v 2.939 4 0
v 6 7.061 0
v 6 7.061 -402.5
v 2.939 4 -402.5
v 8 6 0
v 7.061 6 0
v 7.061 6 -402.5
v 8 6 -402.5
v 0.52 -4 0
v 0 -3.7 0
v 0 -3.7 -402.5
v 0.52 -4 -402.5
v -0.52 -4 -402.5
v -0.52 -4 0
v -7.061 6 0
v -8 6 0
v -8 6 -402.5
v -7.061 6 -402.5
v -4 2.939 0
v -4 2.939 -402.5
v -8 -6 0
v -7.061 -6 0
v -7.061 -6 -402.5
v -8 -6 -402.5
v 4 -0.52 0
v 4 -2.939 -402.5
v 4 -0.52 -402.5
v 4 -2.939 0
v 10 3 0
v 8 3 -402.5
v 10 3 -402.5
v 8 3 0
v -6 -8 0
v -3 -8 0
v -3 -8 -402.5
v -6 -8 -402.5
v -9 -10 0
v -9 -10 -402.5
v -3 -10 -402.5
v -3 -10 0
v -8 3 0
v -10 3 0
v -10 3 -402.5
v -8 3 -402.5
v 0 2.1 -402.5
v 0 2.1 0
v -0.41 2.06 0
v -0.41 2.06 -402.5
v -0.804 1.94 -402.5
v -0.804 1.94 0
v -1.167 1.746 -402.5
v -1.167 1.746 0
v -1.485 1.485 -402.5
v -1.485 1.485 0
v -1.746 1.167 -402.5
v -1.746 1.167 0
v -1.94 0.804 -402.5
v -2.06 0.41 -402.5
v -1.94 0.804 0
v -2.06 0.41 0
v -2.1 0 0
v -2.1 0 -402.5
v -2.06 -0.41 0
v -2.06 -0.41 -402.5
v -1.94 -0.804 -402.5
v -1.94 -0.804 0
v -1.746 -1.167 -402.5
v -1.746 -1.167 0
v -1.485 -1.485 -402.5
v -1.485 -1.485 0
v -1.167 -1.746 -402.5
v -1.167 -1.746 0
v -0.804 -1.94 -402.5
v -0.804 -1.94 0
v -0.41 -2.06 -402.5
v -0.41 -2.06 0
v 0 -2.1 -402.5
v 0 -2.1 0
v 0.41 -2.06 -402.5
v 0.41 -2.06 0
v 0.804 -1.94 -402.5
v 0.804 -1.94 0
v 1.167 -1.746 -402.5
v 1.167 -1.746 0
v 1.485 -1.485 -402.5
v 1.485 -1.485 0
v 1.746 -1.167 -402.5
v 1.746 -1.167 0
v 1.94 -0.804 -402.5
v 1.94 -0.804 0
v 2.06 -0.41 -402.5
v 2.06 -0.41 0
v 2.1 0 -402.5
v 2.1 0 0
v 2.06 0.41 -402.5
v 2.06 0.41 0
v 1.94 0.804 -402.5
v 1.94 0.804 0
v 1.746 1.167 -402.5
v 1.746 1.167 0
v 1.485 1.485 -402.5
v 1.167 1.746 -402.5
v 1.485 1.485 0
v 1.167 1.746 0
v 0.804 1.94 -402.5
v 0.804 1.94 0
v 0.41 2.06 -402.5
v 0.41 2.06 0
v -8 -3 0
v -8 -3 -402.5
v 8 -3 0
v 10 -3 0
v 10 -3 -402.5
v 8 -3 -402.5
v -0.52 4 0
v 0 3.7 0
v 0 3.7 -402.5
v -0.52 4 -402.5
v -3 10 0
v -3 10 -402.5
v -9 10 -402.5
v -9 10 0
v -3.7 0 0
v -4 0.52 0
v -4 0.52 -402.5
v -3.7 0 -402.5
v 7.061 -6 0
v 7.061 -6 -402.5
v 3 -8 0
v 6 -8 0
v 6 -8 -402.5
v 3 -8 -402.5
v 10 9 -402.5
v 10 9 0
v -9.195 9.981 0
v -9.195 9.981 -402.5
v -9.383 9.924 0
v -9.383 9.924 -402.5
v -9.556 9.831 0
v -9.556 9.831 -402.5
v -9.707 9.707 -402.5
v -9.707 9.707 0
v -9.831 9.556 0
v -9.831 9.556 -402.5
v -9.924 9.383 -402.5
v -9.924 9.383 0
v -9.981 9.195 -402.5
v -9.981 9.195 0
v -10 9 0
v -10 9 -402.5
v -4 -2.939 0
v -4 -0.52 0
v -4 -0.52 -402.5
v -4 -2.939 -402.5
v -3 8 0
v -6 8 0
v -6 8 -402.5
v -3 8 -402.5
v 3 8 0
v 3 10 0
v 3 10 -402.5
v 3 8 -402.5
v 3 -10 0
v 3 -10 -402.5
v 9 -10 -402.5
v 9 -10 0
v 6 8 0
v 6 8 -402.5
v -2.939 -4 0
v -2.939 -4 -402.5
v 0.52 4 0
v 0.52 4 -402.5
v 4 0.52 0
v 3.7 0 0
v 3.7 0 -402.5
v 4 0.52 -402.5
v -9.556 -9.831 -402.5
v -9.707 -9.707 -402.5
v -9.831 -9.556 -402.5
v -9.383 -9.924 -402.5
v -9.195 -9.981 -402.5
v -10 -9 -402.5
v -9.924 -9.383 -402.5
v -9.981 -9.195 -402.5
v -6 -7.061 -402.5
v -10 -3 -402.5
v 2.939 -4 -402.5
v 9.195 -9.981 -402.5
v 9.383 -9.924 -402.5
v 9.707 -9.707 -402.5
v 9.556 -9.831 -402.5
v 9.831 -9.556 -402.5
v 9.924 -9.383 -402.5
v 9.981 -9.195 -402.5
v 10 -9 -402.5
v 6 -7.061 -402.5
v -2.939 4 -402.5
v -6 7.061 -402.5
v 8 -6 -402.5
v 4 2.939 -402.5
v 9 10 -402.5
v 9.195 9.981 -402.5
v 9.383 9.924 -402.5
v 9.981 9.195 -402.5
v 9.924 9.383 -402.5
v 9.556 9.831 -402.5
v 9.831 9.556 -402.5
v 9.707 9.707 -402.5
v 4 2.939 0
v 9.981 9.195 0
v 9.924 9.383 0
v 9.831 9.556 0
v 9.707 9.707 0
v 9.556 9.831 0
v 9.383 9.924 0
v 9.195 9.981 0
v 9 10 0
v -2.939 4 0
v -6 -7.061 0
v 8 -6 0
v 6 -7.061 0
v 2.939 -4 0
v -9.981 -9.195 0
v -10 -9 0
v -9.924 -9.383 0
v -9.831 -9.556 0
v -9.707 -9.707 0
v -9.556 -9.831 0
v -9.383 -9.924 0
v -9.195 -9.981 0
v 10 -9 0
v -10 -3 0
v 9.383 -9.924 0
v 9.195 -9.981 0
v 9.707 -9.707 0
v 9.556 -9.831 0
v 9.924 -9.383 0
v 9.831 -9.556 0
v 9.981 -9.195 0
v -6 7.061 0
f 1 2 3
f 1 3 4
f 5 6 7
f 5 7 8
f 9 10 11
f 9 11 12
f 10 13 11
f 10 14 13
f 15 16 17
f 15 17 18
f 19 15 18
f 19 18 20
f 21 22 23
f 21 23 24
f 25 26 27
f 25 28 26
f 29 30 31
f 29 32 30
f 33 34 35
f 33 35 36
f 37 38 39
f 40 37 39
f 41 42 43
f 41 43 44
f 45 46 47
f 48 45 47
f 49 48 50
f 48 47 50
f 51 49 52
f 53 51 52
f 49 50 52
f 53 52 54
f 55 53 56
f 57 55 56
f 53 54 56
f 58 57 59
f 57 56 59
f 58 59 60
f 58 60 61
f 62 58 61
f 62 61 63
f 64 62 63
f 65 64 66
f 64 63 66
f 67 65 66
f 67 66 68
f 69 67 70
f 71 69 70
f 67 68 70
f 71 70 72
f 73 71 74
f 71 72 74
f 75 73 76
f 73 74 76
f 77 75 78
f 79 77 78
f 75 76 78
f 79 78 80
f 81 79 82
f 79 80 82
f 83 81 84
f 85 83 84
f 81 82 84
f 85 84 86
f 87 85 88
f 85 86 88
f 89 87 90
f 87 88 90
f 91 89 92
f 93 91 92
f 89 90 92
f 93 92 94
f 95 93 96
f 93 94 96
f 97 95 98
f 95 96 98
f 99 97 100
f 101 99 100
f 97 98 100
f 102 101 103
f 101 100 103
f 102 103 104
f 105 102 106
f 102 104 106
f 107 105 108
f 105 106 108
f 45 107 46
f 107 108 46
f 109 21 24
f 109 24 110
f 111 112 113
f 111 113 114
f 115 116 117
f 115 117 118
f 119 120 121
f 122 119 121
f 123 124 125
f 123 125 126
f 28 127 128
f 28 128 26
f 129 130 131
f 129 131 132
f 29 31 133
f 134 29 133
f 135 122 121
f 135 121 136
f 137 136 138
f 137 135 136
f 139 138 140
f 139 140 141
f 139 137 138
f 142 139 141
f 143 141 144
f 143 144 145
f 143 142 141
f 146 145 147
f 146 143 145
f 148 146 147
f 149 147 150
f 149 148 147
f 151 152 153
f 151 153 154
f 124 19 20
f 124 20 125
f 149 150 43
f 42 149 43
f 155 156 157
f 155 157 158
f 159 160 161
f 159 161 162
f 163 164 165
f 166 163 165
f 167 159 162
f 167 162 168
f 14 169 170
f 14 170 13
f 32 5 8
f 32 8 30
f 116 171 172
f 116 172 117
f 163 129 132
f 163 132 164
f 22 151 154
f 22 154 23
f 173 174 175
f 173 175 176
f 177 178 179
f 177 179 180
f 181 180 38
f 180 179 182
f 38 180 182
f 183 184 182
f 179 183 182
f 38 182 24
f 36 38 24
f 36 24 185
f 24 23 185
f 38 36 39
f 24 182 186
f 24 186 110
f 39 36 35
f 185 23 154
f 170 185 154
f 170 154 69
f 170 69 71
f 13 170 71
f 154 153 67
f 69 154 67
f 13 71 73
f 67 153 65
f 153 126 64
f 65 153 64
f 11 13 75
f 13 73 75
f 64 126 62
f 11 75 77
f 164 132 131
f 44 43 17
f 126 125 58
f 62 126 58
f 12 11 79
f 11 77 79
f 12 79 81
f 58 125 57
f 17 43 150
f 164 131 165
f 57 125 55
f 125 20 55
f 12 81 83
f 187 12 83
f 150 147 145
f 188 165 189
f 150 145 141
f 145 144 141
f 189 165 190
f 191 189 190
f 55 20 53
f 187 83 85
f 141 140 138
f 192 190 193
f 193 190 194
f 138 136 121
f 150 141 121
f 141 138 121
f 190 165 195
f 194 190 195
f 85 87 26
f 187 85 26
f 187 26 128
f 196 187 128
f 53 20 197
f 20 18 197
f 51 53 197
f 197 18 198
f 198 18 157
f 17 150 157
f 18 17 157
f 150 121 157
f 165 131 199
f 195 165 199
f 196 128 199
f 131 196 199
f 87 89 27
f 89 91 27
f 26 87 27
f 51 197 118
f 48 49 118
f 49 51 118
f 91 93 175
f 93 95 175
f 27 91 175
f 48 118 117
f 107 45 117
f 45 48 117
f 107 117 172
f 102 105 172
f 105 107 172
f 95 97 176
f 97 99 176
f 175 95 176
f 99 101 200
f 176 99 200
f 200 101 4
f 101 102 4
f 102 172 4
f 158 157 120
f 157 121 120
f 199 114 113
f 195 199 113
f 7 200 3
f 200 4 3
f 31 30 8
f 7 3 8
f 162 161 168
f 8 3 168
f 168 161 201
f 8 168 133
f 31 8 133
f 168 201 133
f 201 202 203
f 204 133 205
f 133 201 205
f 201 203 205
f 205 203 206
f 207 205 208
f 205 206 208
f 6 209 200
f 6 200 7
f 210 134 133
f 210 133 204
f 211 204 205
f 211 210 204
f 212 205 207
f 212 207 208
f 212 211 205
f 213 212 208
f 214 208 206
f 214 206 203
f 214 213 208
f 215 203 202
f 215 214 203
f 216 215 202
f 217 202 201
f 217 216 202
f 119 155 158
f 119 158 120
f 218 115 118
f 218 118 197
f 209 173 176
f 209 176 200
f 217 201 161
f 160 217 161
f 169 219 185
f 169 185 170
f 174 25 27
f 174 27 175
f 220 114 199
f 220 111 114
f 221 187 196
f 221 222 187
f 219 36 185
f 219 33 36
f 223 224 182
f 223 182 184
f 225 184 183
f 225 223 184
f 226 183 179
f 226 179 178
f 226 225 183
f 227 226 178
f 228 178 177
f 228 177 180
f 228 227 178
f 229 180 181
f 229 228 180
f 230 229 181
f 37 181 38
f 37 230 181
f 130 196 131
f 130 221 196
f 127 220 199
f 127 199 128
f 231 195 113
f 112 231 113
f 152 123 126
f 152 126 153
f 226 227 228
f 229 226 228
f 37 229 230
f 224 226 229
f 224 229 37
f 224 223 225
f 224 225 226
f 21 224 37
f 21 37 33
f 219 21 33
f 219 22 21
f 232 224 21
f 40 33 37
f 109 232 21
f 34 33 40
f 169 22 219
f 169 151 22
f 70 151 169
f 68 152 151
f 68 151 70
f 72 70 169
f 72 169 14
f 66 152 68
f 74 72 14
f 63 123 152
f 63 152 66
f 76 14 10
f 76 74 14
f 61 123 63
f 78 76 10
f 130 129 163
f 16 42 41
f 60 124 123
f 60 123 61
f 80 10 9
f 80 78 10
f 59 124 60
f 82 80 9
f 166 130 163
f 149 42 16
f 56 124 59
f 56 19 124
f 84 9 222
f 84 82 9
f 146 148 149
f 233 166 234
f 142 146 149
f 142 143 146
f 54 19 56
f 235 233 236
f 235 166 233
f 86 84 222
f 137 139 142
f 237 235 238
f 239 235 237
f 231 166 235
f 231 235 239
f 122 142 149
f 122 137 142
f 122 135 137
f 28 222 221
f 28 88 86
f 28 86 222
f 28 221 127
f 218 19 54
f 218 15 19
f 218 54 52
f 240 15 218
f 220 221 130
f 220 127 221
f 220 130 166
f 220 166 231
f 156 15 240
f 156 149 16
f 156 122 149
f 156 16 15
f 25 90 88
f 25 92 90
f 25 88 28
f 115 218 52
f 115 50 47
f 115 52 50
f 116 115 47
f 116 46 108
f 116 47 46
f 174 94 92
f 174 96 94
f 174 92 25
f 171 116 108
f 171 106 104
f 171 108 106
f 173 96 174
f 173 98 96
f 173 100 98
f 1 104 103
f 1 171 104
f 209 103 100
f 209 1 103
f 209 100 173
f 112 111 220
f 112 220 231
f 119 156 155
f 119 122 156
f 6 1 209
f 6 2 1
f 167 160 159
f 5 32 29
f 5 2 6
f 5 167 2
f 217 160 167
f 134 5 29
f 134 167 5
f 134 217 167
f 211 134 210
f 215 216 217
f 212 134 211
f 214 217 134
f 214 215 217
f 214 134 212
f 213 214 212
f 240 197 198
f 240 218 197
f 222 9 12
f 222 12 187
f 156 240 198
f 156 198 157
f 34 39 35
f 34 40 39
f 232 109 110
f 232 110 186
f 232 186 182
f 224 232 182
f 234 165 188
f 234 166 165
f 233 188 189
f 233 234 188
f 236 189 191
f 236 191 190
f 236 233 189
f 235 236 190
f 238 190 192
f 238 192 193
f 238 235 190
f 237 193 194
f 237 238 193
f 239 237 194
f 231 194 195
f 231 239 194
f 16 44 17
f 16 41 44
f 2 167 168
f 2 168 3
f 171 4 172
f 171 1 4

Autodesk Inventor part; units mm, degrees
sketch "Sketch_1" plane through (0, 0, 0) normal (0, 0, 1) x (1, 0, 0)
  line L0 (-10, -3) -> (-10, -9)
  arc A0 (-10, -9) -> (-9, -10) centre (-9, -9) ccw
  line L1 (-9, -10) -> (-3, -10)
  line L2 (-3, -10) -> (-3, -8)
  line L3 (-3, -8) -> (-6, -8)
  line L4 (-6, -8) -> (-6, -7.0607)
  line L5 (-6, -7.0607) -> (-2.9393, -4)
  line L6 (-2.9393, -4) -> (-0.5196, -4)
  line L7 (-0.5196, -4) -> (0, -3.7)
  line L8 (0, -3.7) -> (0.5196, -4)
  line L9 (0.5196, -4) -> (2.9393, -4)
  line L10 (2.9393, -4) -> (6, -7.0607)
  line L11 (6, -7.0607) -> (6, -8)
  line L12 (6, -8) -> (3, -8)
  line L13 (3, -8) -> (3, -10)
  line L14 (3, -10) -> (9, -10)
  arc A1 (9, -10) -> (10, -9) centre (9, -9) ccw
  line L15 (10, -9) -> (10, -3)
  line L16 (10, -3) -> (8, -3)
  line L17 (8, -3) -> (8, -6)
  line L18 (8, -6) -> (7.0607, -6)
  line L19 (7.0607, -6) -> (4, -2.9393)
  line L20 (4, -2.9393) -> (4, -0.5196)
  line L21 (4, -0.5196) -> (3.7, 0)
  line L22 (3.7, 0) -> (4, 0.5196)
  line L23 (4, 0.5196) -> (4, 2.9393)
  line L24 (4, 2.9393) -> (7.0607, 6)
  line L25 (7.0607, 6) -> (8, 6)
  line L26 (8, 6) -> (8, 3)
  line L27 (8, 3) -> (10, 3)
  line L28 (10, 3) -> (10, 9)
  arc A2 (10, 9) -> (9, 10) centre (9, 9) ccw
  line L29 (9, 10) -> (3, 10)
  line L30 (3, 10) -> (3, 8)
  line L31 (3, 8) -> (6, 8)
  line L32 (6, 8) -> (6, 7.0607)
  line L33 (6, 7.0607) -> (2.9393, 4)
  line L34 (2.9393, 4) -> (0.5196, 4)
  line L35 (0.5196, 4) -> (0, 3.7)
  line L36 (0, 3.7) -> (-0.5196, 4)
  line L37 (-0.5196, 4) -> (-2.9393, 4)
  line L38 (-2.9393, 4) -> (-6, 7.0607)
  line L39 (-6, 7.0607) -> (-6, 8)
  line L40 (-6, 8) -> (-3, 8)
  line L41 (-3, 8) -> (-3, 10)
  line L42 (-3, 10) -> (-9, 10)
  arc A3 (-9, 10) -> (-10, 9) centre (-9, 9) ccw
  line L43 (-10, 9) -> (-10, 3)
  line L44 (-10, 3) -> (-8, 3)
  line L45 (-8, 3) -> (-8, 6)
  line L46 (-8, 6) -> (-7.0607, 6)
  line L47 (-7.0607, 6) -> (-4, 2.9393)
  line L48 (-4, 2.9393) -> (-4, 0.5196)
  line L49 (-4, 0.5196) -> (-3.7, 0)
  line L50 (-3.7, 0) -> (-4, -0.5196)
  line L51 (-4, -0.5196) -> (-4, -2.9393)
  line L52 (-4, -2.9393) -> (-7.0607, -6)
  line L53 (-7.0607, -6) -> (-8, -6)
  line L54 (-8, -6) -> (-8, -3)
  line L55 (-8, -3) -> (-10, -3)
extrude "Extrusion1" add sketch "Sketch_1" against normal blind 402.5
sketch "Sketch2" plane through (0, 0, -402.5) normal (0, 0, -1) x (-1, 0, 0)
  point P0 (0, 0)
hole "Hole1" at (0, 0, -402.5) direction (0, 0, 1) diameter 4.2 depth 402.5
ref_plane "C1_XY" through (0, 0, 0) normal (0, 0, 1) x (1, 0, 0)
ref_plane "C1_YZ" through (0, 0, 0) normal (1, 0, 0) x (0, 1, 0)
ref_plane "C1_ZX" through (0, 0, 0) normal (0, 1, 0) x (0, 0, 1)
properties part number "HFS5-2020-402.5"
